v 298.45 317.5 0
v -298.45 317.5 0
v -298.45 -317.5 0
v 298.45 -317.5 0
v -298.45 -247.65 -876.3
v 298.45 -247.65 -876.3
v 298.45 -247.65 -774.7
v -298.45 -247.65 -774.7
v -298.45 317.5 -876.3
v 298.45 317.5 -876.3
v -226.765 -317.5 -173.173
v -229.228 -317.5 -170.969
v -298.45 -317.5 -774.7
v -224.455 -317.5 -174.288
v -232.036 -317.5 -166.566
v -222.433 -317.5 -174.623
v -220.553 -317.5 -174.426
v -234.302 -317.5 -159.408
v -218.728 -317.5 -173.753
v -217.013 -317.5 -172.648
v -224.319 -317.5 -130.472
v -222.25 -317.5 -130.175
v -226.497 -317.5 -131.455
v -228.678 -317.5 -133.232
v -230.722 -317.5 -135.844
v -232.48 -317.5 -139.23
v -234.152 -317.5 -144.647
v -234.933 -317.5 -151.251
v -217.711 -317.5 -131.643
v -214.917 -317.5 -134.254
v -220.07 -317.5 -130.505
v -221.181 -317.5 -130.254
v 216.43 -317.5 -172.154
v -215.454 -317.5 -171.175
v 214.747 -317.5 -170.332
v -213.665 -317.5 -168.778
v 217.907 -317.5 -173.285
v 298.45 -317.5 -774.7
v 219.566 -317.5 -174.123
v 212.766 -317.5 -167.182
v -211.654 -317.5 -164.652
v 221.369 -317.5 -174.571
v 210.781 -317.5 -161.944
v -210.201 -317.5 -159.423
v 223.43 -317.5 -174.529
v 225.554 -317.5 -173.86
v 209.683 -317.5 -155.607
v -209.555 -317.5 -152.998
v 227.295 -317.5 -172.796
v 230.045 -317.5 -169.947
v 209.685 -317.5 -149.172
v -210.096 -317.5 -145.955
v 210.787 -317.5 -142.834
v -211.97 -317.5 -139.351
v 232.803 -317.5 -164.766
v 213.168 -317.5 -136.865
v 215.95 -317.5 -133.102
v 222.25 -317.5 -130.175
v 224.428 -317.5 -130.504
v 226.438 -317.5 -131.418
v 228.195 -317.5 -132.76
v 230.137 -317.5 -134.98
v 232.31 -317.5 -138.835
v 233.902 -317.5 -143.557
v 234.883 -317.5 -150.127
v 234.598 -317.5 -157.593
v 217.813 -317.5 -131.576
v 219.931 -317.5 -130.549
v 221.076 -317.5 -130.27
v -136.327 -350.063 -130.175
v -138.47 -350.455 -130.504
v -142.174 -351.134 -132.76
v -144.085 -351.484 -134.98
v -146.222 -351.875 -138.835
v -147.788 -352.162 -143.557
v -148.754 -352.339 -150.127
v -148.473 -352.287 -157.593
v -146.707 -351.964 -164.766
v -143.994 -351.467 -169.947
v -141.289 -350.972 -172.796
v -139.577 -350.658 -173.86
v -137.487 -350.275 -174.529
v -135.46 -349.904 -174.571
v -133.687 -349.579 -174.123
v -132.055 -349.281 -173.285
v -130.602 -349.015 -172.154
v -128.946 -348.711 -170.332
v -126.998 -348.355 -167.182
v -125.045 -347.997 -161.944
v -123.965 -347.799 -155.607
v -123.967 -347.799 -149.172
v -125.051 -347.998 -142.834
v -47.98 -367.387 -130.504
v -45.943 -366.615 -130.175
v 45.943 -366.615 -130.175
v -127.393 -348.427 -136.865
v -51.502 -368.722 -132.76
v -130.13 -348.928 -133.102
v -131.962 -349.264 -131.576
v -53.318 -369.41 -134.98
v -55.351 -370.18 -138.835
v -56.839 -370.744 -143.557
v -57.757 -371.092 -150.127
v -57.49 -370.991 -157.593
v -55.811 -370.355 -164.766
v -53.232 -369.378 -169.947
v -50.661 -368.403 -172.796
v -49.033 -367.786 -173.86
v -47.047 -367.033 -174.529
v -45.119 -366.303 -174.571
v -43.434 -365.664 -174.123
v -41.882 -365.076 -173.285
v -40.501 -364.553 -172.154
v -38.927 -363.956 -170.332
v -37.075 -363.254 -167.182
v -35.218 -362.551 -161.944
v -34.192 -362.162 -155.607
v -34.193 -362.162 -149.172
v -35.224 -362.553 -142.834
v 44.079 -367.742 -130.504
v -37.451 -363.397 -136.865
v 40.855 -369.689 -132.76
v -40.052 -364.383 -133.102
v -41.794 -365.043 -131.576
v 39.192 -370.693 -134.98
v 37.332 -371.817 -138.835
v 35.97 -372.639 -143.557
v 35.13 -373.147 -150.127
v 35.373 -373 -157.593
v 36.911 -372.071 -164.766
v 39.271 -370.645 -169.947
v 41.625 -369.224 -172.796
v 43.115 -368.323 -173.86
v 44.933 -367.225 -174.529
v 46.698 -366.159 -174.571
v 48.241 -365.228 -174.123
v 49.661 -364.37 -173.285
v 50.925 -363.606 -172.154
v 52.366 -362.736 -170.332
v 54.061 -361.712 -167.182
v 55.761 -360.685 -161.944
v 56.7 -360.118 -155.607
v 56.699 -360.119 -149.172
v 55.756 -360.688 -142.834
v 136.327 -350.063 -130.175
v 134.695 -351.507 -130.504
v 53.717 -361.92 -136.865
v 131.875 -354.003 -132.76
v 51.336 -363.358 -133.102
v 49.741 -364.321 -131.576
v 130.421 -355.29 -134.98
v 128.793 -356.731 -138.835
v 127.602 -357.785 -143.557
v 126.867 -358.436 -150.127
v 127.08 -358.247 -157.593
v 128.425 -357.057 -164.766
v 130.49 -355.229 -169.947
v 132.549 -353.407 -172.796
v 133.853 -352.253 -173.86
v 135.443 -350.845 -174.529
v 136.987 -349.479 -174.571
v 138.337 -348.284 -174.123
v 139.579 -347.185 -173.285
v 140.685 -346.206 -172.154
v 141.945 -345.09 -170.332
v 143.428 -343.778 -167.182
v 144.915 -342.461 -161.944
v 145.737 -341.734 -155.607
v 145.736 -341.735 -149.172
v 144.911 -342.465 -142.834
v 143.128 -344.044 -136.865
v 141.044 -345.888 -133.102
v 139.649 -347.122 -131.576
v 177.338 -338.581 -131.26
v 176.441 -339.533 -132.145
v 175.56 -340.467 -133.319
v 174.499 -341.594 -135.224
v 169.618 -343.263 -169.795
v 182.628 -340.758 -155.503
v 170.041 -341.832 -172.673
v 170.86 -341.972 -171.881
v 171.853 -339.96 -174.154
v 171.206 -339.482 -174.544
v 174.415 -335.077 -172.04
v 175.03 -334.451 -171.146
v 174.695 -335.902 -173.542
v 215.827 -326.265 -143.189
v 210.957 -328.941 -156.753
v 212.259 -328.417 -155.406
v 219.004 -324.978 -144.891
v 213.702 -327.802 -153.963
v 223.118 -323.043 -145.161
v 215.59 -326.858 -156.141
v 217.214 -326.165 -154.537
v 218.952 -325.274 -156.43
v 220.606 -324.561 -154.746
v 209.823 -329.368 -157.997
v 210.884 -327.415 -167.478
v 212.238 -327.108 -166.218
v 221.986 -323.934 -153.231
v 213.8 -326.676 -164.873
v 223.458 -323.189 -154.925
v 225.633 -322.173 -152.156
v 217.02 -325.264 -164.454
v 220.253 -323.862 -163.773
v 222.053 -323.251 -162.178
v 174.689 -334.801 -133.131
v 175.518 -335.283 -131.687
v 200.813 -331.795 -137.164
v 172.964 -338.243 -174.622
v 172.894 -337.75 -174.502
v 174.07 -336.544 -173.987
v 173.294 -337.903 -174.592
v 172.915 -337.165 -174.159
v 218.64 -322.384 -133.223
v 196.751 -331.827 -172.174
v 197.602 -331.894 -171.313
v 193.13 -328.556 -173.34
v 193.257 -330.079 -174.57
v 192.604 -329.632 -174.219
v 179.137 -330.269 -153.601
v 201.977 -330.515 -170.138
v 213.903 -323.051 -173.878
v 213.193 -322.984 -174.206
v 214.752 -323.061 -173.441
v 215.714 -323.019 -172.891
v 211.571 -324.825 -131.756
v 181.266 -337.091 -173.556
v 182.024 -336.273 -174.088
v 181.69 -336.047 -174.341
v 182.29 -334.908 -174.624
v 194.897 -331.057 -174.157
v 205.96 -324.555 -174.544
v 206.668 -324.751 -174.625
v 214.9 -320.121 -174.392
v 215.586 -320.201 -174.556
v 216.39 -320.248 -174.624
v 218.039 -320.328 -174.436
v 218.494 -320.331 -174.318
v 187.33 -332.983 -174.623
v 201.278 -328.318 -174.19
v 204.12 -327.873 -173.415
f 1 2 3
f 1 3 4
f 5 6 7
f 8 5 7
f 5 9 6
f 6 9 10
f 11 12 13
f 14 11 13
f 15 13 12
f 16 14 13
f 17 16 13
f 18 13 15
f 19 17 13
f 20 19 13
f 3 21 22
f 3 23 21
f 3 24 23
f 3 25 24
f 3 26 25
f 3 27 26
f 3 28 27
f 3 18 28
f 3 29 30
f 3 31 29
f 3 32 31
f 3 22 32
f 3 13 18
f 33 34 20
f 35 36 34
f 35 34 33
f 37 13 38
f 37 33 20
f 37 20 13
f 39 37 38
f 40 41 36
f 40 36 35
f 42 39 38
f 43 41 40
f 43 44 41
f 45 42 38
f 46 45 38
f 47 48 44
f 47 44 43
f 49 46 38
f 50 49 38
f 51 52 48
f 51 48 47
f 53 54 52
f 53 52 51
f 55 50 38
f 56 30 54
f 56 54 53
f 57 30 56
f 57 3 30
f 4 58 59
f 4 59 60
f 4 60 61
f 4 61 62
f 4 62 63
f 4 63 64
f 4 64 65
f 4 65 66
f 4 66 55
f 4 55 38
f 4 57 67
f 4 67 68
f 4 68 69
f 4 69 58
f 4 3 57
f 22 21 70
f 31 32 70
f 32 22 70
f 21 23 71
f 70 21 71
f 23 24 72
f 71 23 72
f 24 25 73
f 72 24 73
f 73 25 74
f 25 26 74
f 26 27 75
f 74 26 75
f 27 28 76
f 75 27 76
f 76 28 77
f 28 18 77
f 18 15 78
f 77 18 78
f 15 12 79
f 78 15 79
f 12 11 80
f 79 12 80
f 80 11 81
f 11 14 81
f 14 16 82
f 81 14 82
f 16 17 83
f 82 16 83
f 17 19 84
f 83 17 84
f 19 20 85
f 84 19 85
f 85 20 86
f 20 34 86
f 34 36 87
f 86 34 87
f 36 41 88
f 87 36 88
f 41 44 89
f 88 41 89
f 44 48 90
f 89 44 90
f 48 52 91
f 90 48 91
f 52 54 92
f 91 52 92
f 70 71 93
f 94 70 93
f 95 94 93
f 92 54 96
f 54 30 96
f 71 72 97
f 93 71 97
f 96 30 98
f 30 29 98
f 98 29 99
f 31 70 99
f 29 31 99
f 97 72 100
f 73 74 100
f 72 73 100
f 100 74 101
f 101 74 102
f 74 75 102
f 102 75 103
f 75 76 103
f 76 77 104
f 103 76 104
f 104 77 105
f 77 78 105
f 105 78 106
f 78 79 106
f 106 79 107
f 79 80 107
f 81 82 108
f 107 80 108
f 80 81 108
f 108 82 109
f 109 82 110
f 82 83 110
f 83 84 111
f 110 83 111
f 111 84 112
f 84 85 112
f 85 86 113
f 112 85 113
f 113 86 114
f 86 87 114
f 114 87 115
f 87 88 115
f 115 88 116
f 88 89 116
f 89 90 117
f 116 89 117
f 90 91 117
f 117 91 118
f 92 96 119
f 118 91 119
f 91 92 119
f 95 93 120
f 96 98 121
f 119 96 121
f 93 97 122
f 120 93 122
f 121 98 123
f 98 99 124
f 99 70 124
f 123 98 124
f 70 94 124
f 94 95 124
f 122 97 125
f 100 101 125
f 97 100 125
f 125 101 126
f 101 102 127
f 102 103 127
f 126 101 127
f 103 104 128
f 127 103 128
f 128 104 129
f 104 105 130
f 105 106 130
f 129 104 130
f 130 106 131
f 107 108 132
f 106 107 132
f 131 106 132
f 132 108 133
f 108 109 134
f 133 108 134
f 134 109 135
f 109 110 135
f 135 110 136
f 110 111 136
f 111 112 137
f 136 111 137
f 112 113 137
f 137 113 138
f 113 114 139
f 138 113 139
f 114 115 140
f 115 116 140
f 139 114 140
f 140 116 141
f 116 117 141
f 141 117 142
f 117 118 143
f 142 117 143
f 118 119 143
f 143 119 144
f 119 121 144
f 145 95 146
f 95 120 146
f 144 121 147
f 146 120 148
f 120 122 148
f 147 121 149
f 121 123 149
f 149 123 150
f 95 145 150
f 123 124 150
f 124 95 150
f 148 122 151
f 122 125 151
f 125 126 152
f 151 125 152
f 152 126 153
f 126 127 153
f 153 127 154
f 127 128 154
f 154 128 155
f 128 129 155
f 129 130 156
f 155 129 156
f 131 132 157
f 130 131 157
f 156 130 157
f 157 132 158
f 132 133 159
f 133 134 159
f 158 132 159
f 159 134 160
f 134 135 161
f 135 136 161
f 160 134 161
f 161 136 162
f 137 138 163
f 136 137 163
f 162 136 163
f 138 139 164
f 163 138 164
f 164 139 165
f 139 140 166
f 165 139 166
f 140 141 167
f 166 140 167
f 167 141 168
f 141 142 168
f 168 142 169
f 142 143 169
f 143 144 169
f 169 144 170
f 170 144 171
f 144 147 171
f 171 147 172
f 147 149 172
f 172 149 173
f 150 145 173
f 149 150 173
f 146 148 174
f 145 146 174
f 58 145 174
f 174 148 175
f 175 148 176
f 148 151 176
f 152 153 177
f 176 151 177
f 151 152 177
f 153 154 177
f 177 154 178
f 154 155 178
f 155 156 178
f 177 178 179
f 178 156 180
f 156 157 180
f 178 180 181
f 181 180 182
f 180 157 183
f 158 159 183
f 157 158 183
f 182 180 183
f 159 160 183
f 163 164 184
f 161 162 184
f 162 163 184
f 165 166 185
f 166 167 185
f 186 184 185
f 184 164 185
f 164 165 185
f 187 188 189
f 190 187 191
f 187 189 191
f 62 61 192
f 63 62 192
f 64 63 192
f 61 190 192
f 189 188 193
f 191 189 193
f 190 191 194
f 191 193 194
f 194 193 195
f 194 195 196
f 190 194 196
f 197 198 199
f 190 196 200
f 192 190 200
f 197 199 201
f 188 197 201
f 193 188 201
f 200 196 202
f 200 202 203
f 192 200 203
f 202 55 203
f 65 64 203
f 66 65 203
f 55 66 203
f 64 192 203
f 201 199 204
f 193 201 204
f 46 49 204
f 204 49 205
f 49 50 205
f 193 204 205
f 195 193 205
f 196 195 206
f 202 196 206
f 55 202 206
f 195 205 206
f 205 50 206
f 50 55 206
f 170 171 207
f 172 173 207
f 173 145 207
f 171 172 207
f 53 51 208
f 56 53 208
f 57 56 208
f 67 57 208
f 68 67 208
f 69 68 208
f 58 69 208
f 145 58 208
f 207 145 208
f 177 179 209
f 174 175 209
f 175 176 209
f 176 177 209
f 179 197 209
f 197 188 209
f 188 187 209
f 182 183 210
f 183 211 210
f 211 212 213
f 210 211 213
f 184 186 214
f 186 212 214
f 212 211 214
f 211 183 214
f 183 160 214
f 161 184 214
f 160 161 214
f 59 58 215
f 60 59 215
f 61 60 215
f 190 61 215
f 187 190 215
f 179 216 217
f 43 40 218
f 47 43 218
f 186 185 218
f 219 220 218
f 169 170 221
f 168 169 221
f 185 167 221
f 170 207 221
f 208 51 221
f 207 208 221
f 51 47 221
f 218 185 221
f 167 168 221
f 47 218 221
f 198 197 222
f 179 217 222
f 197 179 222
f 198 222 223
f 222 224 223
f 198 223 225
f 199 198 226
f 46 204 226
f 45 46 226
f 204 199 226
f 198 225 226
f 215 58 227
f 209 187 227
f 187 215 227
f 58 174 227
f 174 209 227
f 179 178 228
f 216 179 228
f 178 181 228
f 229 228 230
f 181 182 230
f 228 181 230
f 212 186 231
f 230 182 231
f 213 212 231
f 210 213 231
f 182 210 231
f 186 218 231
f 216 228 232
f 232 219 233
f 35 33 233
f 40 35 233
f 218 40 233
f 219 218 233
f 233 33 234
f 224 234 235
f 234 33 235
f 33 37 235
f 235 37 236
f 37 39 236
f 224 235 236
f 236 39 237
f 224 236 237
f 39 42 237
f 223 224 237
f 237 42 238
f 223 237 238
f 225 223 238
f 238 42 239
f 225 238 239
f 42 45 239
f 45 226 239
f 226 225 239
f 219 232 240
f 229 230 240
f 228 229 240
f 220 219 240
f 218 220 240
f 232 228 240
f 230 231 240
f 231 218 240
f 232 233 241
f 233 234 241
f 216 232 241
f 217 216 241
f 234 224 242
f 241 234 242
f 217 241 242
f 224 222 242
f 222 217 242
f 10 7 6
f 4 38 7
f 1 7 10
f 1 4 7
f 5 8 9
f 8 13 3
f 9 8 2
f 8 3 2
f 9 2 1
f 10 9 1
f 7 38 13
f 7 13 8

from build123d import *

# Parameters (mm, degrees)
F0_W     = 596.9
F0_H     = 635
F1_DEPTH = 876.3
F6_W     = 69.85
F6_H     = 101.6
F7_DEPTH = 596.9010001


with BuildPart() as f1:
    # F0 (on Top) → F1 (new body)
    with BuildSketch(Plane.XY):
        Rectangle(F0_W, F0_H)
    extrude(amount=-F1_DEPTH)

    # F5: sweep along a path in F3
    with BuildLine(Plane.XY.offset(-152.4)) as f5_path:
        ThreePointArc((-222.25, -317.5), (23.6275020738, -368.1472825465), (263.7350157491, -294.8719447302))
    # F4 (on face) → F5 (sweep)
    with BuildSketch(Plane.XZ.offset(317.5)):
        with BuildLine():
            add(Edge.make_bspline(
                [(-222.25, -130.175), (-244.2470452561, -130.175), (-233.2485226281, -163.5125), (-222.25, -196.85), (-211.2514773719, -163.5125), (-200.2529547439, -130.175), (-222.25, -130.175)],
                knots=[0, 0, 0, 2.0943951024, 2.0943951024, 4.1887902048, 4.1887902048, 6.2831853072, 6.2831853072, 6.2831853072], degree=2, weights=[1, 0.5, 1, 0.5, 1, 0.5, 1]))
        make_face()
    sweep(path=f5_path.line)

    # F6 (on face) → F7 (cut, through all)
    with BuildSketch(Plane.YZ.offset(298.45)):
        with Locations((-282.575, -825.5)):
            Rectangle(F6_W, F6_H)
    extrude(amount=-F7_DEPTH, mode=Mode.SUBTRACT)


solid = f1.part
